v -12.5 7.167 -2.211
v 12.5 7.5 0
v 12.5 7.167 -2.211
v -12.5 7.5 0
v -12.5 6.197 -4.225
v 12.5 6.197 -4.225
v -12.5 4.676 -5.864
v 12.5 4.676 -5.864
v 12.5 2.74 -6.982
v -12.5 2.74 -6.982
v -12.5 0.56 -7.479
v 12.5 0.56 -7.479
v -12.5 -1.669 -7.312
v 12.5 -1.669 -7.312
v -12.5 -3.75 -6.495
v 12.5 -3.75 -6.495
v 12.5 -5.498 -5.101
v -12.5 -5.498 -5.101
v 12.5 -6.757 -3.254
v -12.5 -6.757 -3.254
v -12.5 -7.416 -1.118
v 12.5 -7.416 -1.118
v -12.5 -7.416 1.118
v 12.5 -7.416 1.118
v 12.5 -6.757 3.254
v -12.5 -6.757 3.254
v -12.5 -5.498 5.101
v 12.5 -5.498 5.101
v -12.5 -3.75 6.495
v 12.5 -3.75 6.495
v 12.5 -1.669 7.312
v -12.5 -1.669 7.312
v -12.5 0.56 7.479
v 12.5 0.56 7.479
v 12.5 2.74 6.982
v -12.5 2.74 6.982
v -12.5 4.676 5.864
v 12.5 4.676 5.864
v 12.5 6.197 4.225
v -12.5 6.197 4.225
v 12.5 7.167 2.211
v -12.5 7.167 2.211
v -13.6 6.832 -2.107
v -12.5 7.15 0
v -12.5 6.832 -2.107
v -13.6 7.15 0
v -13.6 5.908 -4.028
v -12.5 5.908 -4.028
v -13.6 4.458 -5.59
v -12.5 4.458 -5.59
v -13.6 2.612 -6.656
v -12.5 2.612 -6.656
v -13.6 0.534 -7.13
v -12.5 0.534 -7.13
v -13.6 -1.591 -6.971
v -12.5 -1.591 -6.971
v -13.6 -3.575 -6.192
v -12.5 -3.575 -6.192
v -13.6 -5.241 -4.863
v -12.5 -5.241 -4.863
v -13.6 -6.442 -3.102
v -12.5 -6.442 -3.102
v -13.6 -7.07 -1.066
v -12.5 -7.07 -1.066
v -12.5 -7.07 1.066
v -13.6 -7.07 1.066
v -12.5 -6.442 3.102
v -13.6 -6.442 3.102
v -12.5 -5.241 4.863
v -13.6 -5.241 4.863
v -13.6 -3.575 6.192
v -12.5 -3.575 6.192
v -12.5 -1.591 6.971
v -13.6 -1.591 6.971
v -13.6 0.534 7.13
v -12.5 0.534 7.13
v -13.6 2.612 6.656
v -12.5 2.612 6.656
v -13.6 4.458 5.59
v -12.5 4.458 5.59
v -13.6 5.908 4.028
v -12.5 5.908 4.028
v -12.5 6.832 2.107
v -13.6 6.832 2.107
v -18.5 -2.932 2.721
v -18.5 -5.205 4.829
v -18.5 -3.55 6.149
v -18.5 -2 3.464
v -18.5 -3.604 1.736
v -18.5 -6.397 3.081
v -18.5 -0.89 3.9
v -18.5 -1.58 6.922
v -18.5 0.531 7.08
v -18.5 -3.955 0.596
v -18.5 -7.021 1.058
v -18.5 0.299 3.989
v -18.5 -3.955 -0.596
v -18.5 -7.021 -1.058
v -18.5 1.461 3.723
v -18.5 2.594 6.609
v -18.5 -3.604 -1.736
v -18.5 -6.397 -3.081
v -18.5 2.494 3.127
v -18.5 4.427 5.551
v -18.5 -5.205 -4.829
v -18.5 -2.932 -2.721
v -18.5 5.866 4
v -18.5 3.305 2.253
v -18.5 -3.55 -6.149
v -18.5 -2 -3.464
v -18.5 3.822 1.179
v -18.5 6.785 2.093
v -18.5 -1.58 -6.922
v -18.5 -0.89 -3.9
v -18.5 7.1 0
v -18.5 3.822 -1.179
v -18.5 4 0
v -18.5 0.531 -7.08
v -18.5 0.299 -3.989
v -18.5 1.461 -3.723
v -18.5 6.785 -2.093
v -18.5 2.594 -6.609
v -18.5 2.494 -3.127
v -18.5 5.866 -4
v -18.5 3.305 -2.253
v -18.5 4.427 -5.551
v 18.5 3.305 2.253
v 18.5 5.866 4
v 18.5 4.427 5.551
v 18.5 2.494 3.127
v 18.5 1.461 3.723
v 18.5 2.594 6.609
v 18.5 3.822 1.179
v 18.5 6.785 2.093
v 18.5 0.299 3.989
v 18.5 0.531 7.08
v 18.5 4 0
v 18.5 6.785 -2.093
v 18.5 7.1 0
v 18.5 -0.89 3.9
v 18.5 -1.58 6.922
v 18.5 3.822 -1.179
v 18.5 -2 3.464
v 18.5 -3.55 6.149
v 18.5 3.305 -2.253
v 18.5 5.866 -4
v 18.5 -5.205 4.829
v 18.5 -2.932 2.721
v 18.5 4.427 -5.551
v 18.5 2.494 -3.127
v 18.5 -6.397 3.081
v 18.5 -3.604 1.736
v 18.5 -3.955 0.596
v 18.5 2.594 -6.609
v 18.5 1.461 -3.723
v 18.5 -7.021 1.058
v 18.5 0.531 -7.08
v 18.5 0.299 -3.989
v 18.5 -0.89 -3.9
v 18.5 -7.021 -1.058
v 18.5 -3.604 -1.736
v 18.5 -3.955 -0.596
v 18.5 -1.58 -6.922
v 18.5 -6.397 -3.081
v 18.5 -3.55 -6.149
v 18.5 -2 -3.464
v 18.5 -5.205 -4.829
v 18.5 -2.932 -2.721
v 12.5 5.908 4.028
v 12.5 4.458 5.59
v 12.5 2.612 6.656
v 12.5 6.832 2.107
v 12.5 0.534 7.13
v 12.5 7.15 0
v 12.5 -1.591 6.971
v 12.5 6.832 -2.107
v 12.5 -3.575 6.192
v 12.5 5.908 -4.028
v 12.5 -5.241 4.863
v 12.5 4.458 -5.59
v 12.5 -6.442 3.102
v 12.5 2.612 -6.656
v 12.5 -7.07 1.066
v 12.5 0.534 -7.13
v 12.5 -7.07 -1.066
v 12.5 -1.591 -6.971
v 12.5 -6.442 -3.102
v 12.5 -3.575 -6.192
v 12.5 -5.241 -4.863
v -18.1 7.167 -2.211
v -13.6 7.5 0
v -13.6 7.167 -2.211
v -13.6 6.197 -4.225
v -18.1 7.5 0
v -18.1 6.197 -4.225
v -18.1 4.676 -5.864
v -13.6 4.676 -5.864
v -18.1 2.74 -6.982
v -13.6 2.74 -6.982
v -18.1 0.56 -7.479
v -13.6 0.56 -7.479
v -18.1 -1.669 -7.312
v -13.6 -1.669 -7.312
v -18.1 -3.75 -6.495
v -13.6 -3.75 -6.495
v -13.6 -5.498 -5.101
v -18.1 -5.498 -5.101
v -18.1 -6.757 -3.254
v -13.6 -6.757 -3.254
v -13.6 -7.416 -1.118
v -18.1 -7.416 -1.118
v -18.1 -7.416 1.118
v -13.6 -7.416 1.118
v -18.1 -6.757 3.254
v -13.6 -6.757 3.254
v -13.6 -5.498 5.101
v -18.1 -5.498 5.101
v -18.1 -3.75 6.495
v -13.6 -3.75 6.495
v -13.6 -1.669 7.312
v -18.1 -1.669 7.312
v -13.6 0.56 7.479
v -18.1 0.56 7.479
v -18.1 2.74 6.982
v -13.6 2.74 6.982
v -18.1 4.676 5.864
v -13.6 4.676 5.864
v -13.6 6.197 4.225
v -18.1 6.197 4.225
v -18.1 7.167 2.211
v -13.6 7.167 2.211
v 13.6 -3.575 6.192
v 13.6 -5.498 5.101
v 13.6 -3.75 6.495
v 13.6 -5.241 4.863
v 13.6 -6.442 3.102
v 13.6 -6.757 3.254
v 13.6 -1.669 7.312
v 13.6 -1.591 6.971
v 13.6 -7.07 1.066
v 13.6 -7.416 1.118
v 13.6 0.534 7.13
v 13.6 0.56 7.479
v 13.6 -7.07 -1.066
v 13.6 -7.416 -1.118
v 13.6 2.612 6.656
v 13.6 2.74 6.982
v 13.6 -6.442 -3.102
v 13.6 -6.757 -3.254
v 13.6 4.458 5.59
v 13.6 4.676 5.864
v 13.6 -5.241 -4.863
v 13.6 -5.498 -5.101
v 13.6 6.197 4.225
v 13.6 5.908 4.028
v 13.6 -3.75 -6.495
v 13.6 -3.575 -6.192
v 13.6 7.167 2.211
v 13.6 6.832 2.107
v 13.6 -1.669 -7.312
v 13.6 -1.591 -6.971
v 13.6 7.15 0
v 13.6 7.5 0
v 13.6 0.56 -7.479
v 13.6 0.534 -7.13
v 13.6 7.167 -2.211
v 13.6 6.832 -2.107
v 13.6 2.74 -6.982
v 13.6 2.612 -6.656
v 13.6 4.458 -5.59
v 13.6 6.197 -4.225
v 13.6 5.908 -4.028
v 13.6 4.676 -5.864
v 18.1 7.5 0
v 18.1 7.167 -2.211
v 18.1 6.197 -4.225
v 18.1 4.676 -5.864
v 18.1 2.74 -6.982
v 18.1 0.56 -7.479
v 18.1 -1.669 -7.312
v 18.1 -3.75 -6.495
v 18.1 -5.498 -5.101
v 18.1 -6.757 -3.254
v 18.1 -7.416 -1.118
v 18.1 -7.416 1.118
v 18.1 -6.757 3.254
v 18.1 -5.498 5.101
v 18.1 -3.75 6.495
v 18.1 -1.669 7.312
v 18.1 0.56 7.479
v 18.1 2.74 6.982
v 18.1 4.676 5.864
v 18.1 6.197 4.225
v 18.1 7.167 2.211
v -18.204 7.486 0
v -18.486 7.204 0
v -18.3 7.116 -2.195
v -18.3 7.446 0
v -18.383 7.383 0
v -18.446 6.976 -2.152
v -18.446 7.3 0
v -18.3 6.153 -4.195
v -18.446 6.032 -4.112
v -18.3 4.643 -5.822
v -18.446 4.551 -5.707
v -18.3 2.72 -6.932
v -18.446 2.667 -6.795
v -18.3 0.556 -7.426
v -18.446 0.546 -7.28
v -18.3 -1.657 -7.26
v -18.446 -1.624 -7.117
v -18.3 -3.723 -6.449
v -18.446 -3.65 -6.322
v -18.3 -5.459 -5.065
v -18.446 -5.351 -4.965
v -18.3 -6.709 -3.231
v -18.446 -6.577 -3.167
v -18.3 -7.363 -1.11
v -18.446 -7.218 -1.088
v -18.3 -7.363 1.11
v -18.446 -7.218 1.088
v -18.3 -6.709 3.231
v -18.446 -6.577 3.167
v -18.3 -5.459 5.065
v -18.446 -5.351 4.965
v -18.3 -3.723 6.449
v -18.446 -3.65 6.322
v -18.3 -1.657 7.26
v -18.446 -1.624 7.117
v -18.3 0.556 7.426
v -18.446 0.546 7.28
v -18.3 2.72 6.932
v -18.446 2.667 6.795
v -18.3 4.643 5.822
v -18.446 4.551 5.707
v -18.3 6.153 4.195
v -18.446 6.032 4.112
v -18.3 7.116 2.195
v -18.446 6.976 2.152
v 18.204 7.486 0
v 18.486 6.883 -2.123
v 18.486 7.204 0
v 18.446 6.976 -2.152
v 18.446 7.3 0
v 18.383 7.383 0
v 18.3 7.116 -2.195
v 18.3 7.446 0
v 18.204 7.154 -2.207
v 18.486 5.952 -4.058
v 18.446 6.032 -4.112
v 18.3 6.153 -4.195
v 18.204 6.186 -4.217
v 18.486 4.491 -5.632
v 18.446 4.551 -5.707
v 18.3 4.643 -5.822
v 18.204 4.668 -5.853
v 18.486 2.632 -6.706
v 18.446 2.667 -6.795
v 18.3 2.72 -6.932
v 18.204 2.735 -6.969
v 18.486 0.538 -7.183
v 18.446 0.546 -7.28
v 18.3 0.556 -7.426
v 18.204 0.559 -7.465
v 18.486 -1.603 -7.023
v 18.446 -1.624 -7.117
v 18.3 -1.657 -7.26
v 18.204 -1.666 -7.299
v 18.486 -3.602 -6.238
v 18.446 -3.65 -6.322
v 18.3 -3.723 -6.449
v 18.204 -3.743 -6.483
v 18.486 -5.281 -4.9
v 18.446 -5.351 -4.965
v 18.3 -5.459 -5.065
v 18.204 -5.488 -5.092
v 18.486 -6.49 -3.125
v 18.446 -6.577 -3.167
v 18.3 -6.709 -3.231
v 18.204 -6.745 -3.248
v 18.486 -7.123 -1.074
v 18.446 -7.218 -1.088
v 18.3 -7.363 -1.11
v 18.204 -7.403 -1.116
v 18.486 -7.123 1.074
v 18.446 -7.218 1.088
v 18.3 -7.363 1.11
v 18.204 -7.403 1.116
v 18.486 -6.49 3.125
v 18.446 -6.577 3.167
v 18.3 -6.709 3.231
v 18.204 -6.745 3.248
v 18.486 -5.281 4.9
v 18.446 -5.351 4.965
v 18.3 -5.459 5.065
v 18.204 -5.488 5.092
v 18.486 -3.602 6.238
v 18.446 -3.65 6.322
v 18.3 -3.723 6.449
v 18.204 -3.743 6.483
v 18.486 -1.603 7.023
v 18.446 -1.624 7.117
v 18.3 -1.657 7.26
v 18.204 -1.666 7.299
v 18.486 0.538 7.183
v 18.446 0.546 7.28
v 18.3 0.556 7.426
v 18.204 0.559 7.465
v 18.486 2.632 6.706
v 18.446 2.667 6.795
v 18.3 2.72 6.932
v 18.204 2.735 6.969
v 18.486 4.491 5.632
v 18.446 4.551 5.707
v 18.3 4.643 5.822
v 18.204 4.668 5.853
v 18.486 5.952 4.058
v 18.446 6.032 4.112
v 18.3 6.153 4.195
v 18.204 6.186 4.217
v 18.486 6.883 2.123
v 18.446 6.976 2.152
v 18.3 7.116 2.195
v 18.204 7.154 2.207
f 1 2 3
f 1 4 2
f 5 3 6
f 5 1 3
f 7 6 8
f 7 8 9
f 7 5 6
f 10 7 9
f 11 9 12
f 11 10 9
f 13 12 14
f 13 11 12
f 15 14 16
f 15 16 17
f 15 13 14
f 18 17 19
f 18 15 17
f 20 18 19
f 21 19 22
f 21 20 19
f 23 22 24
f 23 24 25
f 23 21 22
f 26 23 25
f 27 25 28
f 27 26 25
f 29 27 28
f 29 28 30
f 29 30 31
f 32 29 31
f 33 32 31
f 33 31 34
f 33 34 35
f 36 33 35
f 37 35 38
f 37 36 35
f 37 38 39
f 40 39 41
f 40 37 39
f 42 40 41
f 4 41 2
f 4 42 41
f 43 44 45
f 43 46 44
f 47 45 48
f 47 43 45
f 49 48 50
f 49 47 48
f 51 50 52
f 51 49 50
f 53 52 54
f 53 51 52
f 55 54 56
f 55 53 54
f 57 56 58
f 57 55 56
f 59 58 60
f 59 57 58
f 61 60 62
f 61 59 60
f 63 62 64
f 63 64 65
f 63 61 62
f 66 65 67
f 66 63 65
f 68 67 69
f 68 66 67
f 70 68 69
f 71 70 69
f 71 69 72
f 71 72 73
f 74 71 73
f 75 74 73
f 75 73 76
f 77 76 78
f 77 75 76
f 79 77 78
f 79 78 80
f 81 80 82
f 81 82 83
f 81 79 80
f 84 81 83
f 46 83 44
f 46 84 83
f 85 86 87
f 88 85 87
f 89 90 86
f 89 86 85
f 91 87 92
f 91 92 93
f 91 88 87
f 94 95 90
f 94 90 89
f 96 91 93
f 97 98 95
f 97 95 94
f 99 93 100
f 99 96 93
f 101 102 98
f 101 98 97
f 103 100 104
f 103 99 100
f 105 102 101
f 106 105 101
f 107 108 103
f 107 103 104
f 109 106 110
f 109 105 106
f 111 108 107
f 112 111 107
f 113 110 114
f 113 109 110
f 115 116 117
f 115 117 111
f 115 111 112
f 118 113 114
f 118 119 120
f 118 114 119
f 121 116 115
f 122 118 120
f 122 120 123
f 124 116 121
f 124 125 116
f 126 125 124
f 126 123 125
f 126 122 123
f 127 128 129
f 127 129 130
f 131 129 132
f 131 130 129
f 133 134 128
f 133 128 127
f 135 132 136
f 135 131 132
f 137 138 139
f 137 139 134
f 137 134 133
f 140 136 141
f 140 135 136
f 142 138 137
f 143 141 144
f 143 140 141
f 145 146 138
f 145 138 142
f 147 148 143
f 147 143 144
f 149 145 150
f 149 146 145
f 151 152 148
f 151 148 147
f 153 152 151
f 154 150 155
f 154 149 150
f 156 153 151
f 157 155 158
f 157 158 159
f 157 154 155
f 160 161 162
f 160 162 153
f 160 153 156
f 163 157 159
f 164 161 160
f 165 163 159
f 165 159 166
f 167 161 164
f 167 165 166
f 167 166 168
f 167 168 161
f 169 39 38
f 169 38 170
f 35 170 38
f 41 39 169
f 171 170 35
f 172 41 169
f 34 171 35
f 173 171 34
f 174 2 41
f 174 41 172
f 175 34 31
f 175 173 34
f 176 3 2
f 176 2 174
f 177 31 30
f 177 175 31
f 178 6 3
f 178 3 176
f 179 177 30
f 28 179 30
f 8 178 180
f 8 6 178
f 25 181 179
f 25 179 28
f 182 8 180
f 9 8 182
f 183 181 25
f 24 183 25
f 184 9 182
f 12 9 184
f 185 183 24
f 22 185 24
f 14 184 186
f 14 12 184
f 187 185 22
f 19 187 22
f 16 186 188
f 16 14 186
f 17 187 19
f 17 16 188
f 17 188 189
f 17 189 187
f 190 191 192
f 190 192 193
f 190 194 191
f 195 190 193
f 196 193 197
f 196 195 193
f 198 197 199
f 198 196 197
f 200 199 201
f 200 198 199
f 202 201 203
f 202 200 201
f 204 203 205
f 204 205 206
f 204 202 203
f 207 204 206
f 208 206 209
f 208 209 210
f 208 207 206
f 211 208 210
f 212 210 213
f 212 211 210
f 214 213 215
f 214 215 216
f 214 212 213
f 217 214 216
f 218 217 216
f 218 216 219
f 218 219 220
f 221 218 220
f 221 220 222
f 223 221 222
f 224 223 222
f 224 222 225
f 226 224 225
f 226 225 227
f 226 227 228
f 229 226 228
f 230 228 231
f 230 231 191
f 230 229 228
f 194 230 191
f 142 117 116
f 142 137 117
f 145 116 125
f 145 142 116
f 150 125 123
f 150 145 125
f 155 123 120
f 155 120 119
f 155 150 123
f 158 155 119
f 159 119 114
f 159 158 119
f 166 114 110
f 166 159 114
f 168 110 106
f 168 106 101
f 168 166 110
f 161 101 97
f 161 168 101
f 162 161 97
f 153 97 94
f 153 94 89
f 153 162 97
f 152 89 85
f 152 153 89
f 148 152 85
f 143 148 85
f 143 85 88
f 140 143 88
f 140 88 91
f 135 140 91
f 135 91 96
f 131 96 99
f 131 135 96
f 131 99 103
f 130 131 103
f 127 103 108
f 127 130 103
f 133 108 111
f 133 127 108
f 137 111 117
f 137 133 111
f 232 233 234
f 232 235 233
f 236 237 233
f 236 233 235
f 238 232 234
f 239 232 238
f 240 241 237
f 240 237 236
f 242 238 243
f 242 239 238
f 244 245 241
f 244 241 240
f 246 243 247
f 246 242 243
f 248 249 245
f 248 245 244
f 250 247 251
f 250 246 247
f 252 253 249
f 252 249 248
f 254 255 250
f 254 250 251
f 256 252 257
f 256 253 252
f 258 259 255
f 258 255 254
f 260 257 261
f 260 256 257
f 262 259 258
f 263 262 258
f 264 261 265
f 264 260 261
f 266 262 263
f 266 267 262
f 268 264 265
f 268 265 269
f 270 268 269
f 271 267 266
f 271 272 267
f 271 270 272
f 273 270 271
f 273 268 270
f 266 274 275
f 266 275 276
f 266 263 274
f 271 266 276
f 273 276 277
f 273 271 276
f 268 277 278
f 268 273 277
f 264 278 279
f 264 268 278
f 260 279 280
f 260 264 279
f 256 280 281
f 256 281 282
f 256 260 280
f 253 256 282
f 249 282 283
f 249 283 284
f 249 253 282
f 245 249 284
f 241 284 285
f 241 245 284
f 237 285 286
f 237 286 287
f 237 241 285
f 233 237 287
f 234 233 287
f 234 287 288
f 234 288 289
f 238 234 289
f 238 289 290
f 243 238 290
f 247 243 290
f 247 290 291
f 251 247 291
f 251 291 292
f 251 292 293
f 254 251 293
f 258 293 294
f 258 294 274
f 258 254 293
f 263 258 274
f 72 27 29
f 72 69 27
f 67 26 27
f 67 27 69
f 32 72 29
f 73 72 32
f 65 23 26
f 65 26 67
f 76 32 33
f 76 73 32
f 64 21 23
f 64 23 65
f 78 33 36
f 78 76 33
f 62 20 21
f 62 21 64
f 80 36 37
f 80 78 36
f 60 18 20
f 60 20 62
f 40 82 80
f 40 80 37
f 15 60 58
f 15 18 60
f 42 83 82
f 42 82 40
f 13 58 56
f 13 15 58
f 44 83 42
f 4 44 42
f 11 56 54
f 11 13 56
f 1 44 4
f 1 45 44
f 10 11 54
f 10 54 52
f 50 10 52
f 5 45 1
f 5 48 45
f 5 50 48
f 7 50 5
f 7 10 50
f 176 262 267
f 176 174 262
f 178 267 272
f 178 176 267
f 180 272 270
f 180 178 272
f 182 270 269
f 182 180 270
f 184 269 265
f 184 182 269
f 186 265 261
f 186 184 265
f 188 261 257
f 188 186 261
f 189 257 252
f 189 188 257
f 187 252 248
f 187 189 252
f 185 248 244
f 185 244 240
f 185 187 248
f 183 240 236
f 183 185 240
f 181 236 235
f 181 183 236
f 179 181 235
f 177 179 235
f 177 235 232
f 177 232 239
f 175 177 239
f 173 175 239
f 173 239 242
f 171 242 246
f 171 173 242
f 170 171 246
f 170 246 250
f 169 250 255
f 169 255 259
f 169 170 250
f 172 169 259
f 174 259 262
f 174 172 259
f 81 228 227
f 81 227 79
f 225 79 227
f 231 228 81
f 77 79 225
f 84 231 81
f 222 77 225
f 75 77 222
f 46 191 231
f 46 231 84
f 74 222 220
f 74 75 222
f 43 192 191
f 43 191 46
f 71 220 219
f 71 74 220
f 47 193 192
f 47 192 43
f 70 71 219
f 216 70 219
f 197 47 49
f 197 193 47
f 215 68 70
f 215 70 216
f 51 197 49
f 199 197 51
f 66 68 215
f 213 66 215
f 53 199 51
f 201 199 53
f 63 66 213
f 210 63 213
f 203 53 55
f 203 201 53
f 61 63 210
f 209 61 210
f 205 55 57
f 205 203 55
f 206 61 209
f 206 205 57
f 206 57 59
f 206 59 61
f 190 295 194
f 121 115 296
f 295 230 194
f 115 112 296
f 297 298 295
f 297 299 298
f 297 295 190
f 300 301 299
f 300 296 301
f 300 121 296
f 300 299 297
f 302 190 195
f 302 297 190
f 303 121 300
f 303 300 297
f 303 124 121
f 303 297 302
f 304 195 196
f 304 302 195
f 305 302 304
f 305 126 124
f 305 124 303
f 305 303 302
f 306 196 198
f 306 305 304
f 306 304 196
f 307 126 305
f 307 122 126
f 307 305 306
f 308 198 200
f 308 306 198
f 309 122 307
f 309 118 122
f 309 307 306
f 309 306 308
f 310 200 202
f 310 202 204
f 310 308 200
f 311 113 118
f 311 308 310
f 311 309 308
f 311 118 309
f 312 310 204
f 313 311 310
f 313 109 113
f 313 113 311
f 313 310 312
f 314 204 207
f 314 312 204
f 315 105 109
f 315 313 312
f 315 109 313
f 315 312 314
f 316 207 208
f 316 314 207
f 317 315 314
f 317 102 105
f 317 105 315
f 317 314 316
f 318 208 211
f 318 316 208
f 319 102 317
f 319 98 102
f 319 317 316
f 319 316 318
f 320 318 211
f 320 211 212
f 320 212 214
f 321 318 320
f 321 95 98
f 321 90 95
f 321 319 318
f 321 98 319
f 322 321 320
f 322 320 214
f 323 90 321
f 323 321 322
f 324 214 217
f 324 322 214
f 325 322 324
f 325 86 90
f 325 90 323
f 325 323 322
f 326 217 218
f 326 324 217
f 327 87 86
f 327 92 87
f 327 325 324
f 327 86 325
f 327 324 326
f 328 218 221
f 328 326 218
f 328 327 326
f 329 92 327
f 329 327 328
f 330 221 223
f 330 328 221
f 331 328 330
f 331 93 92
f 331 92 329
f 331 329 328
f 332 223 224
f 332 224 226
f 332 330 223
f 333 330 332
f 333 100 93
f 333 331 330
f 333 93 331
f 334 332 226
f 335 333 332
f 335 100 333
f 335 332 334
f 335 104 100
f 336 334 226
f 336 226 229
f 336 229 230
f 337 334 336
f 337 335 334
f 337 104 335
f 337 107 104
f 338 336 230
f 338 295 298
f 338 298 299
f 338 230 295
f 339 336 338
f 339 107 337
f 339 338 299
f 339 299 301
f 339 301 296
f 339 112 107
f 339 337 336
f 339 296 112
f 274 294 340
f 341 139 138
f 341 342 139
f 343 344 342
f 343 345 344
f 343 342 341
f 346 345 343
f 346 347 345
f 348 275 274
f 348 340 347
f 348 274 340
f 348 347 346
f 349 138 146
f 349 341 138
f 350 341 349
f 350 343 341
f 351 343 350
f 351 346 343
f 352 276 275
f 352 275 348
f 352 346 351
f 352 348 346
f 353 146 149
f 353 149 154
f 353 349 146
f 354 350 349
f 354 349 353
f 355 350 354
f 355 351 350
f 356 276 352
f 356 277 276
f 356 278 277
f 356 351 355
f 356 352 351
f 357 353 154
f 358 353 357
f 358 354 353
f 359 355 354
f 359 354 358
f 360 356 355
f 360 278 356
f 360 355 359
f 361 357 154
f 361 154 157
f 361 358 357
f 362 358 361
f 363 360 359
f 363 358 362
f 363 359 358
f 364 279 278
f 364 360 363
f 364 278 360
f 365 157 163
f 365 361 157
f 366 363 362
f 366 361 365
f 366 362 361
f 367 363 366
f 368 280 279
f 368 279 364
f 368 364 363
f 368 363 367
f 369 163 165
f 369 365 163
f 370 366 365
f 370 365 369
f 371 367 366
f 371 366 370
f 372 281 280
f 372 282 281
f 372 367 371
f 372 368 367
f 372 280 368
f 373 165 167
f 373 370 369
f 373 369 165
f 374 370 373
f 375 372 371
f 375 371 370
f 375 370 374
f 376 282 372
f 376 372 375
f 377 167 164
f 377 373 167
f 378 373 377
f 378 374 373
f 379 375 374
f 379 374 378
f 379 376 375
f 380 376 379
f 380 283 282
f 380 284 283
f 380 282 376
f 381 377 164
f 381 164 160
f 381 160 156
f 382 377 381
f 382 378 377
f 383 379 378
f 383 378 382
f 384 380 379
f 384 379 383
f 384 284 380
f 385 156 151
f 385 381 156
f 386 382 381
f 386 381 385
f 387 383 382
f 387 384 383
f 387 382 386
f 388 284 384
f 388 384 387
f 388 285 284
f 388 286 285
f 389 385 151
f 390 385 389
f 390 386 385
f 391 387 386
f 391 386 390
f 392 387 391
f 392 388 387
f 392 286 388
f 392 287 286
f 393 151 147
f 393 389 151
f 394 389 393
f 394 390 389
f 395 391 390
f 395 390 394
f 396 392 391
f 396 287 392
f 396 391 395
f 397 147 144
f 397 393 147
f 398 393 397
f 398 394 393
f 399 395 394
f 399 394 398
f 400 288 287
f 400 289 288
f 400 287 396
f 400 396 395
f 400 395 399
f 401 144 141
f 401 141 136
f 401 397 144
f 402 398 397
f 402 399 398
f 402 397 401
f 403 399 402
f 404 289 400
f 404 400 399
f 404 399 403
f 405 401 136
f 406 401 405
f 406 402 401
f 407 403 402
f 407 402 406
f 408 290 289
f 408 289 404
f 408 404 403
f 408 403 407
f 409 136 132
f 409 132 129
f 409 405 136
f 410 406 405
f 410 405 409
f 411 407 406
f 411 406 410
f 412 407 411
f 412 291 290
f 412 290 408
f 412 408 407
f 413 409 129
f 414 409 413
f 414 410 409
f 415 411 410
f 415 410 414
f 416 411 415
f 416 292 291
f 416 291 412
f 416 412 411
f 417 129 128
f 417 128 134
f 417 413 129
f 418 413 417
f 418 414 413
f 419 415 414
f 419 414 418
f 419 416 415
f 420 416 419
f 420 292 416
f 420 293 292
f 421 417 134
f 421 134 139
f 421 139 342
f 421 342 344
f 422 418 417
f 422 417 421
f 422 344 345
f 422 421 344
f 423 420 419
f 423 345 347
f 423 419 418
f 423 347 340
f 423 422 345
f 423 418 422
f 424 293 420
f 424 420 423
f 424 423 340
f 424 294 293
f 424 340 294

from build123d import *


with BuildPart() as part:
    # Sketch1 → Revolve1 (revolve)
    with BuildSketch(Plane.XY):
        with BuildLine():
            Line((-18.5, 7.1), (-18.5, 4))
            Line((-18.5, 4), (18.5, 4))
            Line((18.5, 4), (18.5, 7.1))
            ThreePointArc((18.5, 7.1), (18.382842712, 7.382842712), (18.1, 7.5))
            Line((18.1, 7.5), (13.6, 7.5))
            Line((13.6, 7.5), (13.6, 7.15))
            Line((13.6, 7.15), (12.5, 7.15))
            Line((12.5, 7.15), (12.5, 7.5))
            Line((12.5, 7.5), (-12.5, 7.5))
            Line((-12.5, 7.5), (-12.5, 7.15))
            Line((-12.5, 7.15), (-13.6, 7.15))
            Line((-13.6, 7.15), (-13.6, 7.5))
            Line((-13.6, 7.5), (-18.1, 7.5))
            ThreePointArc((-18.1, 7.5), (-18.382842712, 7.382842712), (-18.5, 7.1))
        make_face()
    revolve(axis=Axis((18.5, 0, 0), (-1, 0, 0)))


solid = part.part
